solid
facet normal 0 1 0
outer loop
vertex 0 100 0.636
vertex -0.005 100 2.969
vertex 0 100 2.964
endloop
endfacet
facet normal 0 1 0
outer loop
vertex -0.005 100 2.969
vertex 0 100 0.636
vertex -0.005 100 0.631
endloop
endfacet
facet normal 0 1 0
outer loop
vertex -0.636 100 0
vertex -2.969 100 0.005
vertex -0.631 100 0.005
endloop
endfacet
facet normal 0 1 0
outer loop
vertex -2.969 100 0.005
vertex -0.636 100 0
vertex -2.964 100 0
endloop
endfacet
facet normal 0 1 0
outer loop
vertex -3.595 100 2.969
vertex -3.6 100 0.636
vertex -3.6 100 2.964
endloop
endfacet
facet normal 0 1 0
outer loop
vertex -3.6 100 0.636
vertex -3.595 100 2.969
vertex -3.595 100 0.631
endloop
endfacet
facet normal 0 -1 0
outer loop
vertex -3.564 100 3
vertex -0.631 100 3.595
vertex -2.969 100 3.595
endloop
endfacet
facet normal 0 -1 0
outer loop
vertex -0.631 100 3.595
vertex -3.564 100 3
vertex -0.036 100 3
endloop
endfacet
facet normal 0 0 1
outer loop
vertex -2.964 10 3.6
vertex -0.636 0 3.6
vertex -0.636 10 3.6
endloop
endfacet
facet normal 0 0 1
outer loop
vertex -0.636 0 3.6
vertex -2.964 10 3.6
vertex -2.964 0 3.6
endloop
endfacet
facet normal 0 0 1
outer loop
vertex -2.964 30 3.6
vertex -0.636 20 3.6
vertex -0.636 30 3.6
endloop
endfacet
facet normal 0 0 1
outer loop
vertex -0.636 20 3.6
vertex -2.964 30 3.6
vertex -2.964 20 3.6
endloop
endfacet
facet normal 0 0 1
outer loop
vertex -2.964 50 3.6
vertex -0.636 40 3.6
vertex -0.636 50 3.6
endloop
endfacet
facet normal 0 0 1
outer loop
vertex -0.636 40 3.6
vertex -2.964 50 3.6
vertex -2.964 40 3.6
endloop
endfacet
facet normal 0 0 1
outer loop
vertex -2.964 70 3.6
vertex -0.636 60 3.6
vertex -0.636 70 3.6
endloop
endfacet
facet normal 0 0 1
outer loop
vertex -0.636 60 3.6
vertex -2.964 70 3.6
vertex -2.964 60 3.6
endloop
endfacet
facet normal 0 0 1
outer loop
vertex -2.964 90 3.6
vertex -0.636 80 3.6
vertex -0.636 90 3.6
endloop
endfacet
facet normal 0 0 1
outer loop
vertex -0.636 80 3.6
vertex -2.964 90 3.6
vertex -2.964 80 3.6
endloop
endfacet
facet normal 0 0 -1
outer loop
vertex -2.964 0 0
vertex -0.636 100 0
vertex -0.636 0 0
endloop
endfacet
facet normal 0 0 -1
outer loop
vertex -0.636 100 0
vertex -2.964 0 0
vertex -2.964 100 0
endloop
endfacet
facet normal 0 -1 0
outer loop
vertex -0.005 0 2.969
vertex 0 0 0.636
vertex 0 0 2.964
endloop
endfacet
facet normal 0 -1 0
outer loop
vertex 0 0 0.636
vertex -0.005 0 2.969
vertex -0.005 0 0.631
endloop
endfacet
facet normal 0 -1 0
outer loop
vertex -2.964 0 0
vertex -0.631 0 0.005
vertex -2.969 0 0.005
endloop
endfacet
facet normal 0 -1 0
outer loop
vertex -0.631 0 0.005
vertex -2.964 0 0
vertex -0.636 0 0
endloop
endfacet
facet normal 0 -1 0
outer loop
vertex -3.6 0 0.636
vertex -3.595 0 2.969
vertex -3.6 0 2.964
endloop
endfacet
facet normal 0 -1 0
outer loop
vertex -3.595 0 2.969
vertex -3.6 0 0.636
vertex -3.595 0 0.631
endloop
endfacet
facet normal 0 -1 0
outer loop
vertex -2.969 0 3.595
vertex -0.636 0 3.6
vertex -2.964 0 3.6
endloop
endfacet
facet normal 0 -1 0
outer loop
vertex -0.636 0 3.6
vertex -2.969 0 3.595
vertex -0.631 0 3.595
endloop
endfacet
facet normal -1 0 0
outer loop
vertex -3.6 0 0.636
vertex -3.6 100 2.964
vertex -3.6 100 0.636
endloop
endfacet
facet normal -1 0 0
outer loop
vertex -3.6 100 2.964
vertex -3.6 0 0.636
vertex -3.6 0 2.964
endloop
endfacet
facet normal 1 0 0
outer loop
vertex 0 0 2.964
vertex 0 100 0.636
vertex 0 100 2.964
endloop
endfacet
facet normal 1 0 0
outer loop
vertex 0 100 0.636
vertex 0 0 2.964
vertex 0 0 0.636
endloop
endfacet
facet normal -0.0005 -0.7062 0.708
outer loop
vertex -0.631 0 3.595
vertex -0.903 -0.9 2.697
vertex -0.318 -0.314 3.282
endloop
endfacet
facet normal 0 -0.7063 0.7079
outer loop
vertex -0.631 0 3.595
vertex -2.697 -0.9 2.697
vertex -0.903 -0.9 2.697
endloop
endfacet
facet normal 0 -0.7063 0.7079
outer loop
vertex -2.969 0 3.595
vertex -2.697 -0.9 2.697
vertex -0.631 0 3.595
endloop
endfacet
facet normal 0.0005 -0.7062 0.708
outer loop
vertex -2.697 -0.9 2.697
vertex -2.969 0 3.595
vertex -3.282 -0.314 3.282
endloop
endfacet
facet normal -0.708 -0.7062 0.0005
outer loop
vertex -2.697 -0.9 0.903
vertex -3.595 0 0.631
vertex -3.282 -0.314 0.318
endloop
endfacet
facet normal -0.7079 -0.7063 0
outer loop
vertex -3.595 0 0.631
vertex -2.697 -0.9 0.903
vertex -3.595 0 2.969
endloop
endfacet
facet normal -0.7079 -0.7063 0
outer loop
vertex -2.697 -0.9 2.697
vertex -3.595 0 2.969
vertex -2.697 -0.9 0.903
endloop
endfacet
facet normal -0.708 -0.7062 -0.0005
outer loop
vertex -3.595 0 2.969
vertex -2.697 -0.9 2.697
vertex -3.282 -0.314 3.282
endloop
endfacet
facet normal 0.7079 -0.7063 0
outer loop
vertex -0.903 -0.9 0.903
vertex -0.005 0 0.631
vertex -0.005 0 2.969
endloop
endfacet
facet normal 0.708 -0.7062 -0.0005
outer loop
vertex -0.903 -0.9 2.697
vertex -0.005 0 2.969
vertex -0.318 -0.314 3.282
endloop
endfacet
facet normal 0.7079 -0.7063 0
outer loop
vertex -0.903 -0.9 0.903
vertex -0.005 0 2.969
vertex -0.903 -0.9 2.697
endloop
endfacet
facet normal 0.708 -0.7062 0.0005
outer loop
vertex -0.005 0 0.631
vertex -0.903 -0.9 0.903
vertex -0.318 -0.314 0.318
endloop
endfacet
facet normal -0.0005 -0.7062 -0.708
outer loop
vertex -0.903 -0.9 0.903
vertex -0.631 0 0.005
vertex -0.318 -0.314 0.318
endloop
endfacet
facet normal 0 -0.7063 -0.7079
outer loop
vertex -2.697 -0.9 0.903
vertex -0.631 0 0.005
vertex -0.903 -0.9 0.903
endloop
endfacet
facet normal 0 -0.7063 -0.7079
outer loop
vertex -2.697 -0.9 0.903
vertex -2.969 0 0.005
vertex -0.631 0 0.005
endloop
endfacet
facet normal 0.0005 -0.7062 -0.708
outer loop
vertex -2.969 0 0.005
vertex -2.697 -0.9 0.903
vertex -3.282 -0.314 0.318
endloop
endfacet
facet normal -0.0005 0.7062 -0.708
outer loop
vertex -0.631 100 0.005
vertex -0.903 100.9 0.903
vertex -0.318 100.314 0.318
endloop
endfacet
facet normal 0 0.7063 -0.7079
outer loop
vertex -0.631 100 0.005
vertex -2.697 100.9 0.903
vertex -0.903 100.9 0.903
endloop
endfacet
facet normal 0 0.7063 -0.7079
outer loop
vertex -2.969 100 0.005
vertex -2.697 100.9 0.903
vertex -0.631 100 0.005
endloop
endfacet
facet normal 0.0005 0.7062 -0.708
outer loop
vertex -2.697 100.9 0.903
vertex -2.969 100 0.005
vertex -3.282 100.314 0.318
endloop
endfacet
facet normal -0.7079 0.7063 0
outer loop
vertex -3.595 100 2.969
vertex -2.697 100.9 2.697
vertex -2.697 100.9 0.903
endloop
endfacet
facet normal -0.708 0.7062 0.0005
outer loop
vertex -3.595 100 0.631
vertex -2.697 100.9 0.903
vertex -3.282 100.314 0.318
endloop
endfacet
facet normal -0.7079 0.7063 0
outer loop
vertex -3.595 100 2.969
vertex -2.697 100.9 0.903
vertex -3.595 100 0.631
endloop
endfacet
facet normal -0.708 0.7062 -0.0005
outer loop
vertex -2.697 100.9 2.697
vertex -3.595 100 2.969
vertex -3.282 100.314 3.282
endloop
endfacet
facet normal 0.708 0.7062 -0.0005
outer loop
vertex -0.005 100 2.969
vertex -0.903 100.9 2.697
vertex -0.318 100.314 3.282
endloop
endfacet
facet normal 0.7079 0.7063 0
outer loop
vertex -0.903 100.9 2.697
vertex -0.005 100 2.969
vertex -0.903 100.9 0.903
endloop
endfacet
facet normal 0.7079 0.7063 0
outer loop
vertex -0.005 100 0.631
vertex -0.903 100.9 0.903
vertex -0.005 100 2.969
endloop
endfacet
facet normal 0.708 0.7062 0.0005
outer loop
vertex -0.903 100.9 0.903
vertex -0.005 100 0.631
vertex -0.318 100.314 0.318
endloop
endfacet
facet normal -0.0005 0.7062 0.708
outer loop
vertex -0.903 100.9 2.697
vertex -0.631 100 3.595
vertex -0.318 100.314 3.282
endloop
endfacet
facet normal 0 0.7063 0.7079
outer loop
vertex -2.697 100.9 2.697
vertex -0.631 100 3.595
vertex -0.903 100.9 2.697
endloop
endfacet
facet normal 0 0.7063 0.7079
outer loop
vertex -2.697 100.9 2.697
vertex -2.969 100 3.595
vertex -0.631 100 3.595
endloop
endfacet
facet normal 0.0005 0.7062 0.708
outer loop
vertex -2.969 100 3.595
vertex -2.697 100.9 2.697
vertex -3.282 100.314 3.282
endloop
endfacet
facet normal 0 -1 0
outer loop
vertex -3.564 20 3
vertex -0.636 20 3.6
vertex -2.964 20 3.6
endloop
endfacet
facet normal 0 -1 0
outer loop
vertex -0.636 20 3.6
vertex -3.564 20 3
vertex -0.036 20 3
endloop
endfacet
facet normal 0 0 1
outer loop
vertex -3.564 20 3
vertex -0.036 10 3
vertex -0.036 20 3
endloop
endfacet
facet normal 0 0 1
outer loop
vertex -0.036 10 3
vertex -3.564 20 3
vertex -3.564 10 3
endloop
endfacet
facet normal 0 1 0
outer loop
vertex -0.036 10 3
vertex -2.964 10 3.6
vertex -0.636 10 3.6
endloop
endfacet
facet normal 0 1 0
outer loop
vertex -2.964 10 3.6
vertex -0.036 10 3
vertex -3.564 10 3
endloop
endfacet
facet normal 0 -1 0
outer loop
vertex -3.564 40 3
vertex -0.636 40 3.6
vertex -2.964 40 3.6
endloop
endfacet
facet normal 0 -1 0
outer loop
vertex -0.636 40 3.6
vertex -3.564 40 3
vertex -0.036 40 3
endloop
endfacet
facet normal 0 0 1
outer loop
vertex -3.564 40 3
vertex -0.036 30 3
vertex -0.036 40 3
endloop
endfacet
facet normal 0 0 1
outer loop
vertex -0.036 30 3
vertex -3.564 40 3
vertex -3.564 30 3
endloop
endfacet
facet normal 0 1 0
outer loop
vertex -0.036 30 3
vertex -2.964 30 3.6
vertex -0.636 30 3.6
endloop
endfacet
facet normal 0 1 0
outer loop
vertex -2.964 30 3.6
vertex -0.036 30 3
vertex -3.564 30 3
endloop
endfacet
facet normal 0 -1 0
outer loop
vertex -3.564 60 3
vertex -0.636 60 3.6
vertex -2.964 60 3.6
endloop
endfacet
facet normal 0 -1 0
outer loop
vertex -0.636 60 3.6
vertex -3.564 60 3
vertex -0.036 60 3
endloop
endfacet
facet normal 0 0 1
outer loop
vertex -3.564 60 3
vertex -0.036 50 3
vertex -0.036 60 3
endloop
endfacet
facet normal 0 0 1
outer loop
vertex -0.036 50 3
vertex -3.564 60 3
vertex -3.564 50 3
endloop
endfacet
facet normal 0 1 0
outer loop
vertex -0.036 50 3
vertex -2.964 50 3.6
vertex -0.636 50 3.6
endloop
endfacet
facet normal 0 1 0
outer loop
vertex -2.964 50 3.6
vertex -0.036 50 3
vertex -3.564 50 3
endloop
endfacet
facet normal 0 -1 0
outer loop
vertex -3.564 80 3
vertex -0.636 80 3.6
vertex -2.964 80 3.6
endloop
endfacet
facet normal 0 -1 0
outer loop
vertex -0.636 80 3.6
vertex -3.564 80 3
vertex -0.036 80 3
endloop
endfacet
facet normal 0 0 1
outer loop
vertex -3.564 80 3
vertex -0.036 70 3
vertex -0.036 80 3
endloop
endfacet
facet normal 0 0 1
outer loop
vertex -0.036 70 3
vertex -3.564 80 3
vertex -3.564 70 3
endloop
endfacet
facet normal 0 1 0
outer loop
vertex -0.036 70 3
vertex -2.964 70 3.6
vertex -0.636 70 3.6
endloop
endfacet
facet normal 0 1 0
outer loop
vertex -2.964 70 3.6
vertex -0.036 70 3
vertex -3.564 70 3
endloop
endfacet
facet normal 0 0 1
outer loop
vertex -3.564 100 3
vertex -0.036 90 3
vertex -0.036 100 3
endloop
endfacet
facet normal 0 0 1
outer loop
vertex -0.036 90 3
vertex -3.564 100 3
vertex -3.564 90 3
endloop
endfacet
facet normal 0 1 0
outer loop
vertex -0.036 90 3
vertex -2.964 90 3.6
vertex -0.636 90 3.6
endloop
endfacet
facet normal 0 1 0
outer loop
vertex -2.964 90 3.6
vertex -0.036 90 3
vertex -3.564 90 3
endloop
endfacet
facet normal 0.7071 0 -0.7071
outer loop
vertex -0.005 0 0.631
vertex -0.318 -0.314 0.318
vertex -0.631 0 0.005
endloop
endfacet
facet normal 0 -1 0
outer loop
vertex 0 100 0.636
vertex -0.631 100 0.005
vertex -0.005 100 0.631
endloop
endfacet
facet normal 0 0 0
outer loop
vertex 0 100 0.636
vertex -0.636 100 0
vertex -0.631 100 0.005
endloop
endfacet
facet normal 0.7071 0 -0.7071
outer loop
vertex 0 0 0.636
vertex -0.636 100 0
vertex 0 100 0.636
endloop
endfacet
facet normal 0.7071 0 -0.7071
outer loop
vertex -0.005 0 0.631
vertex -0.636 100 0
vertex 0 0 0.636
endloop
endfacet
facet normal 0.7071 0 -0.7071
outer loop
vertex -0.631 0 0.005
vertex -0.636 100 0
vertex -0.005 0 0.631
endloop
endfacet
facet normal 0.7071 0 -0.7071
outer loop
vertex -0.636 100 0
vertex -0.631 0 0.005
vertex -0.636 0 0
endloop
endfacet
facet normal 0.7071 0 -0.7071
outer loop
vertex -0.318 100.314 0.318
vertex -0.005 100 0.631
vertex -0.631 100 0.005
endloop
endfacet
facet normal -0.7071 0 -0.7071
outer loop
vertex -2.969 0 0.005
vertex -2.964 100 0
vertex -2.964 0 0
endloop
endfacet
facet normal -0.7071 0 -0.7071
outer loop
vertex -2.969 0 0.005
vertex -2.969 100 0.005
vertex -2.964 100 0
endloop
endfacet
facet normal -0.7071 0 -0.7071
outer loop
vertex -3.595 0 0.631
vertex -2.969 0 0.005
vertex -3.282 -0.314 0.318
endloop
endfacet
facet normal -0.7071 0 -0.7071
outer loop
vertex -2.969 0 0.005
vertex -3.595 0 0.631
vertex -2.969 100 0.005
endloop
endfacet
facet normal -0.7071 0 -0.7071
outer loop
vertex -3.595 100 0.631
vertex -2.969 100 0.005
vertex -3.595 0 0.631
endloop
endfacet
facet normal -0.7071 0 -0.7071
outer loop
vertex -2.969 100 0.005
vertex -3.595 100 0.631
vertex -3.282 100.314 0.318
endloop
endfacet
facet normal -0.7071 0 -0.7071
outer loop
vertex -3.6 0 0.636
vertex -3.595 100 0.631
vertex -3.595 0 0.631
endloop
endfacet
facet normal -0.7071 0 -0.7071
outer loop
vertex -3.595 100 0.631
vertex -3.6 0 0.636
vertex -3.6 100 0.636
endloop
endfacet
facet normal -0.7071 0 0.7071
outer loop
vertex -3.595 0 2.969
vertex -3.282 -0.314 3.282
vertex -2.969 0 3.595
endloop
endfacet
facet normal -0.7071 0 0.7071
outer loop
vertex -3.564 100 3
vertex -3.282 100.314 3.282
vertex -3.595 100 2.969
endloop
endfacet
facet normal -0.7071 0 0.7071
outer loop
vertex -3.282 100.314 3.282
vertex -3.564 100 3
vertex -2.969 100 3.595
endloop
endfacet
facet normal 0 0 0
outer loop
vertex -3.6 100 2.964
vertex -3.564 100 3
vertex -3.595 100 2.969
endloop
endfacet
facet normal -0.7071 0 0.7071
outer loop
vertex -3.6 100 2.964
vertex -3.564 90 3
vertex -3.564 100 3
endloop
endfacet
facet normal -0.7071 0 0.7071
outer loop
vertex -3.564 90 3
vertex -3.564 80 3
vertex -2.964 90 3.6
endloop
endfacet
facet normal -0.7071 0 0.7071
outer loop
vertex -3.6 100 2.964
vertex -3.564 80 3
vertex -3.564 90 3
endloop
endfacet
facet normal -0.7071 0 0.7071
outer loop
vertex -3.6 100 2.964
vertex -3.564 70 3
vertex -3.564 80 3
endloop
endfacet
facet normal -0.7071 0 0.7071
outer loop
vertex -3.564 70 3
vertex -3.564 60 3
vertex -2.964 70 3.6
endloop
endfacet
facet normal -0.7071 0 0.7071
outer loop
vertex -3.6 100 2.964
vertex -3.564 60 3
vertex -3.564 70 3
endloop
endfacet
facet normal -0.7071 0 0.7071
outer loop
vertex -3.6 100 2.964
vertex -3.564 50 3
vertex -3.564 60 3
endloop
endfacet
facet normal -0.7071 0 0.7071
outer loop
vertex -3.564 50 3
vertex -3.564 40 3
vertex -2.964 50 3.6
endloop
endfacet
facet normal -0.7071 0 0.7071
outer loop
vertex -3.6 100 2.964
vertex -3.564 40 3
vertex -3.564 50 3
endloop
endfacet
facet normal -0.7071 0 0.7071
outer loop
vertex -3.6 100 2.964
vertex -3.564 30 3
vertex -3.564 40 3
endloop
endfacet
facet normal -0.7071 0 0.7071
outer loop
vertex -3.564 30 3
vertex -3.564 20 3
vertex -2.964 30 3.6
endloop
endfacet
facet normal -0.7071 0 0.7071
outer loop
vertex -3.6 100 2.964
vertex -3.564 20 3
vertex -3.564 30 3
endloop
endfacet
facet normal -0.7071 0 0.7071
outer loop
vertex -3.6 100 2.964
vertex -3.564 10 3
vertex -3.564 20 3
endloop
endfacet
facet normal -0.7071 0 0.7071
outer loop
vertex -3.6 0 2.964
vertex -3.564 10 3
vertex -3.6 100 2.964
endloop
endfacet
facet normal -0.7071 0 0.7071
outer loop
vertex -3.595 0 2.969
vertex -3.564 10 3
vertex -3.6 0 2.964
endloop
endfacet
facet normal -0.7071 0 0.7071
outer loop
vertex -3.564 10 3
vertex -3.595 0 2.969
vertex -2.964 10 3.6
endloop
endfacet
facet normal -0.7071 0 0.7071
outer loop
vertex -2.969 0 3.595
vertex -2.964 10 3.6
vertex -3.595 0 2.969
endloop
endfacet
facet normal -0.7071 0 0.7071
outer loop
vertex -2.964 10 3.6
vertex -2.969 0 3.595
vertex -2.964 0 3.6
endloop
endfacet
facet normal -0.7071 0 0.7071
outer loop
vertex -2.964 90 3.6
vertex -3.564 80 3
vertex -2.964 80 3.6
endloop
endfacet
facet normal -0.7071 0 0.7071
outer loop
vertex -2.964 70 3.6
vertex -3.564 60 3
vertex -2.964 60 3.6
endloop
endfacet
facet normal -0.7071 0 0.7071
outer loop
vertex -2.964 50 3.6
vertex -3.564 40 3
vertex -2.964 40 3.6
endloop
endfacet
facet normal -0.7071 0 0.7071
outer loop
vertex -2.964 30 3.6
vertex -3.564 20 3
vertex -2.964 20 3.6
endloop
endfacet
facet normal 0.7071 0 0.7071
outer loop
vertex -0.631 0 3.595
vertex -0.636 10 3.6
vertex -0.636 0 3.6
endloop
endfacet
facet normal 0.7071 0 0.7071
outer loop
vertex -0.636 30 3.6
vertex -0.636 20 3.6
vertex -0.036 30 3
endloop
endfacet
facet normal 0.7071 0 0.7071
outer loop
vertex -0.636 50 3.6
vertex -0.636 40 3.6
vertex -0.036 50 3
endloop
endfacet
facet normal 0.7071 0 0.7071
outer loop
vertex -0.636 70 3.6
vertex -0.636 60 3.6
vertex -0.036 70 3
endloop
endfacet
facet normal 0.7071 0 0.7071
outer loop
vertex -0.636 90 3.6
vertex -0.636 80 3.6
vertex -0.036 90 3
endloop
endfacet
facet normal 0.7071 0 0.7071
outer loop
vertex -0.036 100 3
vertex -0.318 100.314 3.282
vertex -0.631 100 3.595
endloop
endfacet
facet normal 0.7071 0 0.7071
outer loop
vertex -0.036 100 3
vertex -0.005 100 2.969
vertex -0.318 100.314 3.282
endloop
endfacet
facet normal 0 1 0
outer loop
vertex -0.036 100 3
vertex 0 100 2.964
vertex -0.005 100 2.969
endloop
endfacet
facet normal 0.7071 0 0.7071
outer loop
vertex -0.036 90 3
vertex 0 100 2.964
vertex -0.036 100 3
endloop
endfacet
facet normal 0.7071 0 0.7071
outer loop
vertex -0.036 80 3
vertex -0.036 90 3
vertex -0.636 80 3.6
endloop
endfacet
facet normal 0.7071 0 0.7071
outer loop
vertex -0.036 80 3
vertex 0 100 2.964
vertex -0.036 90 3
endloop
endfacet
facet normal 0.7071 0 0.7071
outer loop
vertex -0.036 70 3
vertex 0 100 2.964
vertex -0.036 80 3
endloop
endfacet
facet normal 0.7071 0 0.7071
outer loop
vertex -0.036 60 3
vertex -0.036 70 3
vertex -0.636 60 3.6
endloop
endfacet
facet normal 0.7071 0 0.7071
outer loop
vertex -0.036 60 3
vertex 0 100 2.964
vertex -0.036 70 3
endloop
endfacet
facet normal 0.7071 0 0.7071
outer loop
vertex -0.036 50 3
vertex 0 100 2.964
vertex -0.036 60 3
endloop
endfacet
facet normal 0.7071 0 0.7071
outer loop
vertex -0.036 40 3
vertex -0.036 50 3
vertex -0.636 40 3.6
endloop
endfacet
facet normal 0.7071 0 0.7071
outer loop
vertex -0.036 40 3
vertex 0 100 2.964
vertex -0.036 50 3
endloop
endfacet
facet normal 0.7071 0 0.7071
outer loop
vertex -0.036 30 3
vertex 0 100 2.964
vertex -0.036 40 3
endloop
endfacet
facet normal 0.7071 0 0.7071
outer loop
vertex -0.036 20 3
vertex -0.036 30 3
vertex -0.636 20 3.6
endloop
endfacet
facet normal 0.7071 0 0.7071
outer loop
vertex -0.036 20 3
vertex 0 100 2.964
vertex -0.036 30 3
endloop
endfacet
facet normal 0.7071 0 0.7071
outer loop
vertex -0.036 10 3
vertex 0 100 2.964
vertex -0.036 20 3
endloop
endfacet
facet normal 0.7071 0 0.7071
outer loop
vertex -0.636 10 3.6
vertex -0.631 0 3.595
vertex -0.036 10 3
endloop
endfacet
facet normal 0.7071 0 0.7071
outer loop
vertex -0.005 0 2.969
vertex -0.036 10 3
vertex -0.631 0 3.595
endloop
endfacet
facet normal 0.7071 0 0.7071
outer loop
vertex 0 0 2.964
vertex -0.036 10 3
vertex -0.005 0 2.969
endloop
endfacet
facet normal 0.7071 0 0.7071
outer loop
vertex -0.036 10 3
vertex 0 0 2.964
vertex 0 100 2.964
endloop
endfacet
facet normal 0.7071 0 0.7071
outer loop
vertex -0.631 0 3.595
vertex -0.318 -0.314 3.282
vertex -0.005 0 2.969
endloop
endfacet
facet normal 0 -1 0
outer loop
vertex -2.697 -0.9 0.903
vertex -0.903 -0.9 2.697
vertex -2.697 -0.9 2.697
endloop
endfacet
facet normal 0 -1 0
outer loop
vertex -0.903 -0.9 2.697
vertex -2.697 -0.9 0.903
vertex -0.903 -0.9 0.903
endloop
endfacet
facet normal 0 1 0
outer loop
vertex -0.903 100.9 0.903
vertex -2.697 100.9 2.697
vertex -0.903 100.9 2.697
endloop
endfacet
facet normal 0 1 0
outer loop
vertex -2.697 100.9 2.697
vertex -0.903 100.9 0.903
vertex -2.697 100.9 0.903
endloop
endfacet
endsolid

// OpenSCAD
// file: funciones_puntos.scad
function vector(p1, p2) = [p2[0] - p1[0], p2[1] - p1[1], p2[2] - p1[2]];

function rotar_punto(p, respecto_a, grados) = 
    let(q = vector(p, respecto_a), m = norm(q)) 
        respecto_a + [m * cos(grados), 0, m * sin(grados)];

function producto_escalar(u, v) = [u[1] * v[2] - u[2] * v[1], - u[0] * v[2] + u[2] * v[0], u[0] * v[1] - u[1] * v[0]];

module lado(vertices, offcentro = 0, grosor_lado = 1) {
    n_vertices = len(vertices);
    punto_medio = punto_medio(vertices);
    
    //vertice(punto_medio);
    
    off_vertices = [    
        for (i=[0:n_vertices - 1])
            let (vector = vector(punto_medio, vertices[i]))
                vertices[i] + vector * offcentro / norm(vector)
    ];
        
    //vertices(off_vertices);
        
    u = vector(off_vertices[1], off_vertices[0]);
    v = vector(off_vertices[2], off_vertices[0]);
        
    //dibujar_vector(off_vertices[1], off_vertices[0]);
    //dibujar_vector(off_vertices[2], off_vertices[0]);
        
    producto_escalar = producto_escalar(u, v);
        
    //dibujar_vector(punto_medio, producto_escalar);
        
    incremento = grosor_lado * producto_escalar / (2 * norm(producto_escalar));
    
    vertices_pol = [
        for (i = [0:2 * n_vertices - 1])
            i < n_vertices
                ? off_vertices[i]              - incremento
                : off_vertices[i - n_vertices] + incremento
    ];
        
    caras_pol = [
        for (i = [0:n_vertices - 1])
            [i, n_vertices + i, n_vertices + (i+1) % n_vertices, (i+1) % n_vertices]
    ];
        
    caras_pol2 = [
        [for (i=[0:n_vertices - 1]) i],
        [for (i=[0:n_vertices - 1]) 2 * n_vertices - i - 1]
    ];
    
    polyhedron(
        vertices_pol, 
        concat(caras_pol, caras_pol2)
    );
}

function punto_medio(vertices, i, n_vertices) = 
    n_vertices == undef 
        ? (
            len(vertices) == 0 
                ? undef 
                : punto_medio(vertices, 0, len(vertices))
        ) 
        : (
            i == n_vertices 
                ? [0, 0, 0] 
                : (vertices[i] / n_vertices) + punto_medio(vertices, i + 1, n_vertices)
        );

function punto_medio_2(u, v) = (u + v) / 2;

function suma_lista(lista, l = -1) = 
    l == -1 
        ? (
            len(lista) == 1 
                ? lista[0] 
                : lista[len(lista) - 1] + suma_lista(lista, len(lista) - 2)
        ) 
        : (
            l == 0 
                ? lista[0] 
                : lista[l] + suma_lista(lista, l - 1)
        );

module vertice(p, diametro = 1) {
    translate(p) sphere(d = diametro);
}

module vertices(vertices, diametro = 1) {
    for (i = [0:len(vertices) - 1]) {
        vertice(vertices[i]);
    }
}

module arista(a, b, diametro = 1) {
    vector = vector(a, b);
    
    translate(punto_medio_2(a, b))
        rotate(angulos_vector(vector))
            cylinder(norm(vector), d=diametro, center=true);
}

function angulos_vector(v) = 
    v[0] != 0
    ? [
        0,
        v[0] > 0 ? acos(v[2]/norm(v)) : 360 - acos(v[2]/norm(v)),
        atan(v[1] / v[0])
    ]
    : (
        v[1] != 0
        ? [v[2] == 0 ? (/* Punto sobre el eje y */ v[1] < 0 ? 90 : 270 ) : (v[1] > 0 ? -90 : 90) + atan(v[2] / v[1]), 0, 0]
        : (
            v[2] == 0 // Es un punto en el eje z, y como ya estaba en el eje z no hay que hacer nada
                ? undef 
                : [v[2] > 0 ? 0 : 180, 0, 0]
        )
    );

module dibujar_vector(a, b, diametro = 1, diametro_cono = 2.5) {
    ratio          = 0.8;
    vector         = vector(a, b);
    punto_division = a + vector * ratio;
    
    arista(a, punto_division, diametro); 
    //vertices([a, b]);
    
    translate(punto_medio_2(punto_division, b))
        rotate(angulos_vector(vector))
            cylinder(norm(vector) * (1 - ratio), d1=diametro_cono, d2=0, center=true);
}

module esfera_en_punto(punto, diametro) {
    translate(punto) sphere(d=diametro);   
}

module recta_por_punto(punto, vector) {
    translate(punto)
        rotate(angulos_vector(vector))
            cylinder(h=500, d=1, center=true);
}

function angulo_triangulo_por_lados(lado1, lado2, lado3) = acos((lado1 * lado1 - lado2 * lado2 - lado3 * lado3) / (- 2 * lado2 * lado3));

module triangulo_por_lados(lado1, lado2, lado3) {
    alpha = angulo_triangulo_por_lados(lado2, lado1, lado3);
    
    p1 = [0, 0, 0];
    p2 = [lado1, 0, 0];
    p3 = [cos(alpha) * lado3, sin(alpha) * lado3, 0];
    
    translate(-baricentro) {
        arista(p1, p2);
        arista(p2, p3);
        arista(p3, p1);
    }
    
    baricentro = (p1 + p2 + p3) / 3;
};
// main file
$fn = 20;

use <funciones_puntos.scad>

ancho_cubo       = 9;
ancho_hueco      = 4.4;
alto_cubo        = 12;
margen_cubo_palo = 0.4;
alto_marcas_palo = 0.6;

///

alto_cubo2  = alto_cubo / 2;
ancho_palo  = 3.6;
ancho_palo2 = ancho_palo / 2;

///

//cubo(ancho_hueco);

cubo_reglado(100);


module cubo_reglado(longitud) {
    longitud2 = longitud / 2;
    corte_esquina = ancho_palo2 / 2;
    d = ancho_palo * 1.41;
    
    rotate(90)  {
        difference() {
            union () {
                cube([longitud, ancho_palo, ancho_palo]);
                rotate(-90) translate([-ancho_palo2, 0, ancho_palo2]) rotate([90]) rotate([0, 0, 45]) cylinder(ancho_palo2, d1 = d, d2 = 0, $fn=4);
                rotate(-90)  translate([-ancho_palo2, longitud, ancho_palo2]) rotate([-90]) rotate([0, 0, 45]) cylinder(ancho_palo2, d1 = d, d2 = 0, $fn=4);
            }
            
            translate([longitud2, 0])                      rotate([45]) cube([longitud+20, corte_esquina, corte_esquina], true);
            translate([longitud2, ancho_palo])             rotate([45]) cube([longitud+20, corte_esquina, corte_esquina], true);
            translate([longitud2, ancho_palo, ancho_palo]) rotate([45]) cube([longitud+20, corte_esquina, corte_esquina], true);
            translate([longitud2, 0, ancho_palo])          rotate([45]) cube([longitud+20, corte_esquina, corte_esquina], true);
            translate([-ancho_palo * 1.25, 0]) cube(ancho_palo); 
            translate([longitud + ancho_palo * 0.25, 0]) cube(ancho_palo); 
            
            for (i=[10:20:longitud - 1]) {
                translate([i, 0, ancho_palo - alto_marcas_palo]) 
                    cube([10, ancho_palo, alto_marcas_palo]);
            }
        }
    }
}

module cubo(ancho_hueco) {
    ancho_piramide = ancho_hueco + 5;
    ancho_piramide2 = ancho_piramide / 2;
    alto_piramide = 3;
    alto_piramide2 = alto_piramide / 2;
    
    translate([0, 0, alto_cubo2]) 
        difference() {
            cube([ancho_cubo, ancho_cubo, alto_cubo], true);
            union() {
                cube([ancho_hueco, ancho_hueco, alto_cubo + 1], true);
                translate([0, 0, -alto_cubo2 + alto_piramide2]) rotate(45) cylinder(alto_piramide, d1=ancho_piramide, d2=0, $fn=4, center=true);
                translate([0, 0, alto_cubo2 - alto_piramide2]) rotate(45) cylinder(alto_piramide, d2=ancho_piramide, d1=0, $fn=4, center=true);
            }
        }
}
